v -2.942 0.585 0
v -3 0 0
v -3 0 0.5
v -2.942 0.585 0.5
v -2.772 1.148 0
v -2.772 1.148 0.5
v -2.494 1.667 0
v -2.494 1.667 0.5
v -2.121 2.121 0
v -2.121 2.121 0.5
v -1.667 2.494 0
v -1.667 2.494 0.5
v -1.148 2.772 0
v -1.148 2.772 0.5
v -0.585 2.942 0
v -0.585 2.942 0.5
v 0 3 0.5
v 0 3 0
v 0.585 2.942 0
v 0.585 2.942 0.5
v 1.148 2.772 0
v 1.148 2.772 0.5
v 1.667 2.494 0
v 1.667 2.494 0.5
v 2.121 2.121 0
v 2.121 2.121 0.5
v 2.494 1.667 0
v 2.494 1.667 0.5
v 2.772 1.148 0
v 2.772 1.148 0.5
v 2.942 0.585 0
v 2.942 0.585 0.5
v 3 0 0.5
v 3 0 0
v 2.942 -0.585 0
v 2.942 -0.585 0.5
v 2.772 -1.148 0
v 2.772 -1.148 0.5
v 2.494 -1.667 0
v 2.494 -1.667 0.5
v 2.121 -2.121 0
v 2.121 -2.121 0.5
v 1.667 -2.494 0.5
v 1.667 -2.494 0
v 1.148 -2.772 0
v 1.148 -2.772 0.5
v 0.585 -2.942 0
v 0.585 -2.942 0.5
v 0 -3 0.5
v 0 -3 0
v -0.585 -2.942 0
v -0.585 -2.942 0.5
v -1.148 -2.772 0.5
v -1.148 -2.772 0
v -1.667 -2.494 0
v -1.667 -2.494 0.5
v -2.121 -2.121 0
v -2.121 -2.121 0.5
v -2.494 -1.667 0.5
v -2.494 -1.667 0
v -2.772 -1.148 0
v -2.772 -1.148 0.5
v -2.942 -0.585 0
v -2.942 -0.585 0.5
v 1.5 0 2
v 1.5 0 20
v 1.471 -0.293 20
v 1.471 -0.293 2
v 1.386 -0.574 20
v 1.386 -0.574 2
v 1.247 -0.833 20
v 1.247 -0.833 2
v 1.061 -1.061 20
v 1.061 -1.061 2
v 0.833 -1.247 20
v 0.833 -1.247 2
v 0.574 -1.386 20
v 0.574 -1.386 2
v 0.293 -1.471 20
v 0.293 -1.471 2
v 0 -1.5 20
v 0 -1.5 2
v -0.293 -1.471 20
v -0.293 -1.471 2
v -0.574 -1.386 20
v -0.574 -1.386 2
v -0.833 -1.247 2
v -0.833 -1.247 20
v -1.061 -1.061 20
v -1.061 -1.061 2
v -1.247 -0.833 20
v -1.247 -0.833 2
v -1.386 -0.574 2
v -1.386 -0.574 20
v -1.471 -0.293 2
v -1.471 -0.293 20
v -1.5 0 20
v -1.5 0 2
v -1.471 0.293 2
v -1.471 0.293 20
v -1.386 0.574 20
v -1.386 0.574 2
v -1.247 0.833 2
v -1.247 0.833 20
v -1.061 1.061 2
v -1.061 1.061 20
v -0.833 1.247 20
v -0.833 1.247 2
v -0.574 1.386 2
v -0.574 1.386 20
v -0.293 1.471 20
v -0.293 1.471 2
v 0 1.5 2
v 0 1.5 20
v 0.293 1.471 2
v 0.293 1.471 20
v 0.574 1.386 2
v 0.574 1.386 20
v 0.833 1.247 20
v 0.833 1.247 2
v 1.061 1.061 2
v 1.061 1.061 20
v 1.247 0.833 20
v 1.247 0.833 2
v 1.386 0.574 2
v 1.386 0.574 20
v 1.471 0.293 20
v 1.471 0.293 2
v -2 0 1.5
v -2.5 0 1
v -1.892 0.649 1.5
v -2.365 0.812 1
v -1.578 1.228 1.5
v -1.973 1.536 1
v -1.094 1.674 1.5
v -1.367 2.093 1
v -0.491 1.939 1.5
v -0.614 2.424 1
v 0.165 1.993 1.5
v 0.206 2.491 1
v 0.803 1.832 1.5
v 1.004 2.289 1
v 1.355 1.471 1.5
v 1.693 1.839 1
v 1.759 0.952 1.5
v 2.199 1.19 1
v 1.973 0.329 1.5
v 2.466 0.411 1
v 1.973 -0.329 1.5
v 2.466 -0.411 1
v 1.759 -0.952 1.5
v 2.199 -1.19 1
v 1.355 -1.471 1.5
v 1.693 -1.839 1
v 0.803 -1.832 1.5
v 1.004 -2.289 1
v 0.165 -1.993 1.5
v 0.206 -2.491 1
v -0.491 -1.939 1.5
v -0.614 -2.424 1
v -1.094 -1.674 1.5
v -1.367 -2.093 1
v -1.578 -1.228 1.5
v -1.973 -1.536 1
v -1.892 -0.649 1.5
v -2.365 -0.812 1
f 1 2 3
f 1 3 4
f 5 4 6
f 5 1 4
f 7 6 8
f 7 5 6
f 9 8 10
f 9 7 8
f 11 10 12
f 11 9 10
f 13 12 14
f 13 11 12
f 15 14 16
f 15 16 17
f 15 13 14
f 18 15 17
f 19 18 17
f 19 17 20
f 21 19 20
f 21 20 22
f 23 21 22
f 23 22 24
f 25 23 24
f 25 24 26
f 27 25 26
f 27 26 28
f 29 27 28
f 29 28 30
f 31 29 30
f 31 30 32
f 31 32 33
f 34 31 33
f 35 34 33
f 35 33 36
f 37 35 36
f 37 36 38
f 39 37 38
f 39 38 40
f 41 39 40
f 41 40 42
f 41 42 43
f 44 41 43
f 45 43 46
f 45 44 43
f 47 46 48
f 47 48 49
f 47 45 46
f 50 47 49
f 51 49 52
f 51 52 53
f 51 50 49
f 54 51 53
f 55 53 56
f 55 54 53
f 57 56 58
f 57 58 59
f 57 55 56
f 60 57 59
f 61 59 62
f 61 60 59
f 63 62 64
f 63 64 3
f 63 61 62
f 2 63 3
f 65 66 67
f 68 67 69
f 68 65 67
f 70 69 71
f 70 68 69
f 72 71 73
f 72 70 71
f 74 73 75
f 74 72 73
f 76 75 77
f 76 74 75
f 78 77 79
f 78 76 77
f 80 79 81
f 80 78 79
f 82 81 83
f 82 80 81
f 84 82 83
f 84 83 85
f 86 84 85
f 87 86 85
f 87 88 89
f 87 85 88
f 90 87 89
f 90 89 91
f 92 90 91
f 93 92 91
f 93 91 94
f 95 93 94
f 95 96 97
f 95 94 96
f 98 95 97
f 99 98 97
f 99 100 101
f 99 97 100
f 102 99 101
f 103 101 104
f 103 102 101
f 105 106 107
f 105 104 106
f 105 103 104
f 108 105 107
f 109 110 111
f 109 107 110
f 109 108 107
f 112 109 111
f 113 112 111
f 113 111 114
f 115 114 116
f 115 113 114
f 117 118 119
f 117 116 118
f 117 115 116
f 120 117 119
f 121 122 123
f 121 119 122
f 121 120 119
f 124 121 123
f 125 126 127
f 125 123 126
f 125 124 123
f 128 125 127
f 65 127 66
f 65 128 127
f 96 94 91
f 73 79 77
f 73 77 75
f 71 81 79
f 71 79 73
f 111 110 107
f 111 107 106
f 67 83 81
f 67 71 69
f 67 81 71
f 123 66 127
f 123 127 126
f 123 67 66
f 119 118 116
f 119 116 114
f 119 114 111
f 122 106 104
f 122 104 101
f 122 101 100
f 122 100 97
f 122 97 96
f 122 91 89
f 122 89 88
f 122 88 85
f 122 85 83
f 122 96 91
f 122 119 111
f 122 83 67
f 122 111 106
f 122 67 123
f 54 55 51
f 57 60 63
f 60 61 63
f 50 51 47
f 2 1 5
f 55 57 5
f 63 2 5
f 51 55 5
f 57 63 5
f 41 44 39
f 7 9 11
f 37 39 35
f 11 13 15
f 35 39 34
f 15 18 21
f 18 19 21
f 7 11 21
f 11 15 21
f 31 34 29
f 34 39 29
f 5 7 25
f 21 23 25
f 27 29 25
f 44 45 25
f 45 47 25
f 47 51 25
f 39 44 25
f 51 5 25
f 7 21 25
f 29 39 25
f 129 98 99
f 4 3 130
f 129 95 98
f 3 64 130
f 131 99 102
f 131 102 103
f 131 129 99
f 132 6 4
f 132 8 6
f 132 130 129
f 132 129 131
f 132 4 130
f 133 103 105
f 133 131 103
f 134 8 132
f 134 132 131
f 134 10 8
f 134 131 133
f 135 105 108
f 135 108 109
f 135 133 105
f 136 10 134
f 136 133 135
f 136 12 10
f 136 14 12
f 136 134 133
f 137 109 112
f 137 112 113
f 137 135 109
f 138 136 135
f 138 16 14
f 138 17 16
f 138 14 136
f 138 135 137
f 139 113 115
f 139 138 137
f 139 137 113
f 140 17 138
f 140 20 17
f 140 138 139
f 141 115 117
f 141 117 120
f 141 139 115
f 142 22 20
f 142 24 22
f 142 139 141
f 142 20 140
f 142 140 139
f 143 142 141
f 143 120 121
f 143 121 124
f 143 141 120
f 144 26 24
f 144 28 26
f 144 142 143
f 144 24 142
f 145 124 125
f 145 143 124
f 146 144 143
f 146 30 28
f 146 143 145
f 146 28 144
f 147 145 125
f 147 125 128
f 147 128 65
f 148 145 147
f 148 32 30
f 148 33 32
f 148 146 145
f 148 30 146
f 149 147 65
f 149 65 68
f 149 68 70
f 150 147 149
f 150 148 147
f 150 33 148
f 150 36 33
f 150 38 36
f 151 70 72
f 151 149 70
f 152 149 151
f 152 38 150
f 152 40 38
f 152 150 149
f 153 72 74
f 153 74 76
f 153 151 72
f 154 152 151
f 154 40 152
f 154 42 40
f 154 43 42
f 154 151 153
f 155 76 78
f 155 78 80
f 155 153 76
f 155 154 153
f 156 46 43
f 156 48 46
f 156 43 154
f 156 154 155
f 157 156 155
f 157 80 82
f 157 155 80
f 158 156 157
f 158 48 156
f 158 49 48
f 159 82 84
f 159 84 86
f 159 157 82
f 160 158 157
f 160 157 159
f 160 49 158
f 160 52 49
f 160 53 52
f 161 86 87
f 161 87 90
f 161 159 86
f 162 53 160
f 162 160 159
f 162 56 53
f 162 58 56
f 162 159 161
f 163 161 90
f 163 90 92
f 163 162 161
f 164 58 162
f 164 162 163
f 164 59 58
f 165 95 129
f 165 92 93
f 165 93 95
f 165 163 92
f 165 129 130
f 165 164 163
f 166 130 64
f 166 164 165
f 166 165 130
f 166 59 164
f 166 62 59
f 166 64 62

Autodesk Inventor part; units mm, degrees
ref_plane "YZ Plane" through (0, 0, 0) normal (1, 0, 0) x (0, 1, 0)
ref_plane "XZ Plane" through (0, 0, 0) normal (0, 1, 0) x (-1, 0, 0)
ref_plane "XY Plane" through (0, 0, 0) normal (0, 0, 1) x (1, 0, 0)
sketch "スケッチ1" plane through (0, 0, 0) normal (0, 0, 1) x (1, 0, 0)
  circle A0 centre (0, 0) radius 1.5
  dimension "d0" = 3
extrude "押し出し1" add sketch "スケッチ1" along normal blind 20
sketch "スケッチ2" plane through (0, 0, 0) normal (0, 0, -1) x (-1, 0, 0)
  circle A0 centre (0, 0) radius 3
  dimension "d3" = 6
extrude "押し出し2" add sketch "スケッチ2" against normal blind 2
thread "ねじ1" size "M3x0.5" class "6g" standard "ANSI Metric M Profile" full length
chamfer "面取り1" distance 1.5 angle 45 1 edges at (3, 0, 2)
properties part number "ネジ皿m3,20" material "鋼、高強度、低合金"
